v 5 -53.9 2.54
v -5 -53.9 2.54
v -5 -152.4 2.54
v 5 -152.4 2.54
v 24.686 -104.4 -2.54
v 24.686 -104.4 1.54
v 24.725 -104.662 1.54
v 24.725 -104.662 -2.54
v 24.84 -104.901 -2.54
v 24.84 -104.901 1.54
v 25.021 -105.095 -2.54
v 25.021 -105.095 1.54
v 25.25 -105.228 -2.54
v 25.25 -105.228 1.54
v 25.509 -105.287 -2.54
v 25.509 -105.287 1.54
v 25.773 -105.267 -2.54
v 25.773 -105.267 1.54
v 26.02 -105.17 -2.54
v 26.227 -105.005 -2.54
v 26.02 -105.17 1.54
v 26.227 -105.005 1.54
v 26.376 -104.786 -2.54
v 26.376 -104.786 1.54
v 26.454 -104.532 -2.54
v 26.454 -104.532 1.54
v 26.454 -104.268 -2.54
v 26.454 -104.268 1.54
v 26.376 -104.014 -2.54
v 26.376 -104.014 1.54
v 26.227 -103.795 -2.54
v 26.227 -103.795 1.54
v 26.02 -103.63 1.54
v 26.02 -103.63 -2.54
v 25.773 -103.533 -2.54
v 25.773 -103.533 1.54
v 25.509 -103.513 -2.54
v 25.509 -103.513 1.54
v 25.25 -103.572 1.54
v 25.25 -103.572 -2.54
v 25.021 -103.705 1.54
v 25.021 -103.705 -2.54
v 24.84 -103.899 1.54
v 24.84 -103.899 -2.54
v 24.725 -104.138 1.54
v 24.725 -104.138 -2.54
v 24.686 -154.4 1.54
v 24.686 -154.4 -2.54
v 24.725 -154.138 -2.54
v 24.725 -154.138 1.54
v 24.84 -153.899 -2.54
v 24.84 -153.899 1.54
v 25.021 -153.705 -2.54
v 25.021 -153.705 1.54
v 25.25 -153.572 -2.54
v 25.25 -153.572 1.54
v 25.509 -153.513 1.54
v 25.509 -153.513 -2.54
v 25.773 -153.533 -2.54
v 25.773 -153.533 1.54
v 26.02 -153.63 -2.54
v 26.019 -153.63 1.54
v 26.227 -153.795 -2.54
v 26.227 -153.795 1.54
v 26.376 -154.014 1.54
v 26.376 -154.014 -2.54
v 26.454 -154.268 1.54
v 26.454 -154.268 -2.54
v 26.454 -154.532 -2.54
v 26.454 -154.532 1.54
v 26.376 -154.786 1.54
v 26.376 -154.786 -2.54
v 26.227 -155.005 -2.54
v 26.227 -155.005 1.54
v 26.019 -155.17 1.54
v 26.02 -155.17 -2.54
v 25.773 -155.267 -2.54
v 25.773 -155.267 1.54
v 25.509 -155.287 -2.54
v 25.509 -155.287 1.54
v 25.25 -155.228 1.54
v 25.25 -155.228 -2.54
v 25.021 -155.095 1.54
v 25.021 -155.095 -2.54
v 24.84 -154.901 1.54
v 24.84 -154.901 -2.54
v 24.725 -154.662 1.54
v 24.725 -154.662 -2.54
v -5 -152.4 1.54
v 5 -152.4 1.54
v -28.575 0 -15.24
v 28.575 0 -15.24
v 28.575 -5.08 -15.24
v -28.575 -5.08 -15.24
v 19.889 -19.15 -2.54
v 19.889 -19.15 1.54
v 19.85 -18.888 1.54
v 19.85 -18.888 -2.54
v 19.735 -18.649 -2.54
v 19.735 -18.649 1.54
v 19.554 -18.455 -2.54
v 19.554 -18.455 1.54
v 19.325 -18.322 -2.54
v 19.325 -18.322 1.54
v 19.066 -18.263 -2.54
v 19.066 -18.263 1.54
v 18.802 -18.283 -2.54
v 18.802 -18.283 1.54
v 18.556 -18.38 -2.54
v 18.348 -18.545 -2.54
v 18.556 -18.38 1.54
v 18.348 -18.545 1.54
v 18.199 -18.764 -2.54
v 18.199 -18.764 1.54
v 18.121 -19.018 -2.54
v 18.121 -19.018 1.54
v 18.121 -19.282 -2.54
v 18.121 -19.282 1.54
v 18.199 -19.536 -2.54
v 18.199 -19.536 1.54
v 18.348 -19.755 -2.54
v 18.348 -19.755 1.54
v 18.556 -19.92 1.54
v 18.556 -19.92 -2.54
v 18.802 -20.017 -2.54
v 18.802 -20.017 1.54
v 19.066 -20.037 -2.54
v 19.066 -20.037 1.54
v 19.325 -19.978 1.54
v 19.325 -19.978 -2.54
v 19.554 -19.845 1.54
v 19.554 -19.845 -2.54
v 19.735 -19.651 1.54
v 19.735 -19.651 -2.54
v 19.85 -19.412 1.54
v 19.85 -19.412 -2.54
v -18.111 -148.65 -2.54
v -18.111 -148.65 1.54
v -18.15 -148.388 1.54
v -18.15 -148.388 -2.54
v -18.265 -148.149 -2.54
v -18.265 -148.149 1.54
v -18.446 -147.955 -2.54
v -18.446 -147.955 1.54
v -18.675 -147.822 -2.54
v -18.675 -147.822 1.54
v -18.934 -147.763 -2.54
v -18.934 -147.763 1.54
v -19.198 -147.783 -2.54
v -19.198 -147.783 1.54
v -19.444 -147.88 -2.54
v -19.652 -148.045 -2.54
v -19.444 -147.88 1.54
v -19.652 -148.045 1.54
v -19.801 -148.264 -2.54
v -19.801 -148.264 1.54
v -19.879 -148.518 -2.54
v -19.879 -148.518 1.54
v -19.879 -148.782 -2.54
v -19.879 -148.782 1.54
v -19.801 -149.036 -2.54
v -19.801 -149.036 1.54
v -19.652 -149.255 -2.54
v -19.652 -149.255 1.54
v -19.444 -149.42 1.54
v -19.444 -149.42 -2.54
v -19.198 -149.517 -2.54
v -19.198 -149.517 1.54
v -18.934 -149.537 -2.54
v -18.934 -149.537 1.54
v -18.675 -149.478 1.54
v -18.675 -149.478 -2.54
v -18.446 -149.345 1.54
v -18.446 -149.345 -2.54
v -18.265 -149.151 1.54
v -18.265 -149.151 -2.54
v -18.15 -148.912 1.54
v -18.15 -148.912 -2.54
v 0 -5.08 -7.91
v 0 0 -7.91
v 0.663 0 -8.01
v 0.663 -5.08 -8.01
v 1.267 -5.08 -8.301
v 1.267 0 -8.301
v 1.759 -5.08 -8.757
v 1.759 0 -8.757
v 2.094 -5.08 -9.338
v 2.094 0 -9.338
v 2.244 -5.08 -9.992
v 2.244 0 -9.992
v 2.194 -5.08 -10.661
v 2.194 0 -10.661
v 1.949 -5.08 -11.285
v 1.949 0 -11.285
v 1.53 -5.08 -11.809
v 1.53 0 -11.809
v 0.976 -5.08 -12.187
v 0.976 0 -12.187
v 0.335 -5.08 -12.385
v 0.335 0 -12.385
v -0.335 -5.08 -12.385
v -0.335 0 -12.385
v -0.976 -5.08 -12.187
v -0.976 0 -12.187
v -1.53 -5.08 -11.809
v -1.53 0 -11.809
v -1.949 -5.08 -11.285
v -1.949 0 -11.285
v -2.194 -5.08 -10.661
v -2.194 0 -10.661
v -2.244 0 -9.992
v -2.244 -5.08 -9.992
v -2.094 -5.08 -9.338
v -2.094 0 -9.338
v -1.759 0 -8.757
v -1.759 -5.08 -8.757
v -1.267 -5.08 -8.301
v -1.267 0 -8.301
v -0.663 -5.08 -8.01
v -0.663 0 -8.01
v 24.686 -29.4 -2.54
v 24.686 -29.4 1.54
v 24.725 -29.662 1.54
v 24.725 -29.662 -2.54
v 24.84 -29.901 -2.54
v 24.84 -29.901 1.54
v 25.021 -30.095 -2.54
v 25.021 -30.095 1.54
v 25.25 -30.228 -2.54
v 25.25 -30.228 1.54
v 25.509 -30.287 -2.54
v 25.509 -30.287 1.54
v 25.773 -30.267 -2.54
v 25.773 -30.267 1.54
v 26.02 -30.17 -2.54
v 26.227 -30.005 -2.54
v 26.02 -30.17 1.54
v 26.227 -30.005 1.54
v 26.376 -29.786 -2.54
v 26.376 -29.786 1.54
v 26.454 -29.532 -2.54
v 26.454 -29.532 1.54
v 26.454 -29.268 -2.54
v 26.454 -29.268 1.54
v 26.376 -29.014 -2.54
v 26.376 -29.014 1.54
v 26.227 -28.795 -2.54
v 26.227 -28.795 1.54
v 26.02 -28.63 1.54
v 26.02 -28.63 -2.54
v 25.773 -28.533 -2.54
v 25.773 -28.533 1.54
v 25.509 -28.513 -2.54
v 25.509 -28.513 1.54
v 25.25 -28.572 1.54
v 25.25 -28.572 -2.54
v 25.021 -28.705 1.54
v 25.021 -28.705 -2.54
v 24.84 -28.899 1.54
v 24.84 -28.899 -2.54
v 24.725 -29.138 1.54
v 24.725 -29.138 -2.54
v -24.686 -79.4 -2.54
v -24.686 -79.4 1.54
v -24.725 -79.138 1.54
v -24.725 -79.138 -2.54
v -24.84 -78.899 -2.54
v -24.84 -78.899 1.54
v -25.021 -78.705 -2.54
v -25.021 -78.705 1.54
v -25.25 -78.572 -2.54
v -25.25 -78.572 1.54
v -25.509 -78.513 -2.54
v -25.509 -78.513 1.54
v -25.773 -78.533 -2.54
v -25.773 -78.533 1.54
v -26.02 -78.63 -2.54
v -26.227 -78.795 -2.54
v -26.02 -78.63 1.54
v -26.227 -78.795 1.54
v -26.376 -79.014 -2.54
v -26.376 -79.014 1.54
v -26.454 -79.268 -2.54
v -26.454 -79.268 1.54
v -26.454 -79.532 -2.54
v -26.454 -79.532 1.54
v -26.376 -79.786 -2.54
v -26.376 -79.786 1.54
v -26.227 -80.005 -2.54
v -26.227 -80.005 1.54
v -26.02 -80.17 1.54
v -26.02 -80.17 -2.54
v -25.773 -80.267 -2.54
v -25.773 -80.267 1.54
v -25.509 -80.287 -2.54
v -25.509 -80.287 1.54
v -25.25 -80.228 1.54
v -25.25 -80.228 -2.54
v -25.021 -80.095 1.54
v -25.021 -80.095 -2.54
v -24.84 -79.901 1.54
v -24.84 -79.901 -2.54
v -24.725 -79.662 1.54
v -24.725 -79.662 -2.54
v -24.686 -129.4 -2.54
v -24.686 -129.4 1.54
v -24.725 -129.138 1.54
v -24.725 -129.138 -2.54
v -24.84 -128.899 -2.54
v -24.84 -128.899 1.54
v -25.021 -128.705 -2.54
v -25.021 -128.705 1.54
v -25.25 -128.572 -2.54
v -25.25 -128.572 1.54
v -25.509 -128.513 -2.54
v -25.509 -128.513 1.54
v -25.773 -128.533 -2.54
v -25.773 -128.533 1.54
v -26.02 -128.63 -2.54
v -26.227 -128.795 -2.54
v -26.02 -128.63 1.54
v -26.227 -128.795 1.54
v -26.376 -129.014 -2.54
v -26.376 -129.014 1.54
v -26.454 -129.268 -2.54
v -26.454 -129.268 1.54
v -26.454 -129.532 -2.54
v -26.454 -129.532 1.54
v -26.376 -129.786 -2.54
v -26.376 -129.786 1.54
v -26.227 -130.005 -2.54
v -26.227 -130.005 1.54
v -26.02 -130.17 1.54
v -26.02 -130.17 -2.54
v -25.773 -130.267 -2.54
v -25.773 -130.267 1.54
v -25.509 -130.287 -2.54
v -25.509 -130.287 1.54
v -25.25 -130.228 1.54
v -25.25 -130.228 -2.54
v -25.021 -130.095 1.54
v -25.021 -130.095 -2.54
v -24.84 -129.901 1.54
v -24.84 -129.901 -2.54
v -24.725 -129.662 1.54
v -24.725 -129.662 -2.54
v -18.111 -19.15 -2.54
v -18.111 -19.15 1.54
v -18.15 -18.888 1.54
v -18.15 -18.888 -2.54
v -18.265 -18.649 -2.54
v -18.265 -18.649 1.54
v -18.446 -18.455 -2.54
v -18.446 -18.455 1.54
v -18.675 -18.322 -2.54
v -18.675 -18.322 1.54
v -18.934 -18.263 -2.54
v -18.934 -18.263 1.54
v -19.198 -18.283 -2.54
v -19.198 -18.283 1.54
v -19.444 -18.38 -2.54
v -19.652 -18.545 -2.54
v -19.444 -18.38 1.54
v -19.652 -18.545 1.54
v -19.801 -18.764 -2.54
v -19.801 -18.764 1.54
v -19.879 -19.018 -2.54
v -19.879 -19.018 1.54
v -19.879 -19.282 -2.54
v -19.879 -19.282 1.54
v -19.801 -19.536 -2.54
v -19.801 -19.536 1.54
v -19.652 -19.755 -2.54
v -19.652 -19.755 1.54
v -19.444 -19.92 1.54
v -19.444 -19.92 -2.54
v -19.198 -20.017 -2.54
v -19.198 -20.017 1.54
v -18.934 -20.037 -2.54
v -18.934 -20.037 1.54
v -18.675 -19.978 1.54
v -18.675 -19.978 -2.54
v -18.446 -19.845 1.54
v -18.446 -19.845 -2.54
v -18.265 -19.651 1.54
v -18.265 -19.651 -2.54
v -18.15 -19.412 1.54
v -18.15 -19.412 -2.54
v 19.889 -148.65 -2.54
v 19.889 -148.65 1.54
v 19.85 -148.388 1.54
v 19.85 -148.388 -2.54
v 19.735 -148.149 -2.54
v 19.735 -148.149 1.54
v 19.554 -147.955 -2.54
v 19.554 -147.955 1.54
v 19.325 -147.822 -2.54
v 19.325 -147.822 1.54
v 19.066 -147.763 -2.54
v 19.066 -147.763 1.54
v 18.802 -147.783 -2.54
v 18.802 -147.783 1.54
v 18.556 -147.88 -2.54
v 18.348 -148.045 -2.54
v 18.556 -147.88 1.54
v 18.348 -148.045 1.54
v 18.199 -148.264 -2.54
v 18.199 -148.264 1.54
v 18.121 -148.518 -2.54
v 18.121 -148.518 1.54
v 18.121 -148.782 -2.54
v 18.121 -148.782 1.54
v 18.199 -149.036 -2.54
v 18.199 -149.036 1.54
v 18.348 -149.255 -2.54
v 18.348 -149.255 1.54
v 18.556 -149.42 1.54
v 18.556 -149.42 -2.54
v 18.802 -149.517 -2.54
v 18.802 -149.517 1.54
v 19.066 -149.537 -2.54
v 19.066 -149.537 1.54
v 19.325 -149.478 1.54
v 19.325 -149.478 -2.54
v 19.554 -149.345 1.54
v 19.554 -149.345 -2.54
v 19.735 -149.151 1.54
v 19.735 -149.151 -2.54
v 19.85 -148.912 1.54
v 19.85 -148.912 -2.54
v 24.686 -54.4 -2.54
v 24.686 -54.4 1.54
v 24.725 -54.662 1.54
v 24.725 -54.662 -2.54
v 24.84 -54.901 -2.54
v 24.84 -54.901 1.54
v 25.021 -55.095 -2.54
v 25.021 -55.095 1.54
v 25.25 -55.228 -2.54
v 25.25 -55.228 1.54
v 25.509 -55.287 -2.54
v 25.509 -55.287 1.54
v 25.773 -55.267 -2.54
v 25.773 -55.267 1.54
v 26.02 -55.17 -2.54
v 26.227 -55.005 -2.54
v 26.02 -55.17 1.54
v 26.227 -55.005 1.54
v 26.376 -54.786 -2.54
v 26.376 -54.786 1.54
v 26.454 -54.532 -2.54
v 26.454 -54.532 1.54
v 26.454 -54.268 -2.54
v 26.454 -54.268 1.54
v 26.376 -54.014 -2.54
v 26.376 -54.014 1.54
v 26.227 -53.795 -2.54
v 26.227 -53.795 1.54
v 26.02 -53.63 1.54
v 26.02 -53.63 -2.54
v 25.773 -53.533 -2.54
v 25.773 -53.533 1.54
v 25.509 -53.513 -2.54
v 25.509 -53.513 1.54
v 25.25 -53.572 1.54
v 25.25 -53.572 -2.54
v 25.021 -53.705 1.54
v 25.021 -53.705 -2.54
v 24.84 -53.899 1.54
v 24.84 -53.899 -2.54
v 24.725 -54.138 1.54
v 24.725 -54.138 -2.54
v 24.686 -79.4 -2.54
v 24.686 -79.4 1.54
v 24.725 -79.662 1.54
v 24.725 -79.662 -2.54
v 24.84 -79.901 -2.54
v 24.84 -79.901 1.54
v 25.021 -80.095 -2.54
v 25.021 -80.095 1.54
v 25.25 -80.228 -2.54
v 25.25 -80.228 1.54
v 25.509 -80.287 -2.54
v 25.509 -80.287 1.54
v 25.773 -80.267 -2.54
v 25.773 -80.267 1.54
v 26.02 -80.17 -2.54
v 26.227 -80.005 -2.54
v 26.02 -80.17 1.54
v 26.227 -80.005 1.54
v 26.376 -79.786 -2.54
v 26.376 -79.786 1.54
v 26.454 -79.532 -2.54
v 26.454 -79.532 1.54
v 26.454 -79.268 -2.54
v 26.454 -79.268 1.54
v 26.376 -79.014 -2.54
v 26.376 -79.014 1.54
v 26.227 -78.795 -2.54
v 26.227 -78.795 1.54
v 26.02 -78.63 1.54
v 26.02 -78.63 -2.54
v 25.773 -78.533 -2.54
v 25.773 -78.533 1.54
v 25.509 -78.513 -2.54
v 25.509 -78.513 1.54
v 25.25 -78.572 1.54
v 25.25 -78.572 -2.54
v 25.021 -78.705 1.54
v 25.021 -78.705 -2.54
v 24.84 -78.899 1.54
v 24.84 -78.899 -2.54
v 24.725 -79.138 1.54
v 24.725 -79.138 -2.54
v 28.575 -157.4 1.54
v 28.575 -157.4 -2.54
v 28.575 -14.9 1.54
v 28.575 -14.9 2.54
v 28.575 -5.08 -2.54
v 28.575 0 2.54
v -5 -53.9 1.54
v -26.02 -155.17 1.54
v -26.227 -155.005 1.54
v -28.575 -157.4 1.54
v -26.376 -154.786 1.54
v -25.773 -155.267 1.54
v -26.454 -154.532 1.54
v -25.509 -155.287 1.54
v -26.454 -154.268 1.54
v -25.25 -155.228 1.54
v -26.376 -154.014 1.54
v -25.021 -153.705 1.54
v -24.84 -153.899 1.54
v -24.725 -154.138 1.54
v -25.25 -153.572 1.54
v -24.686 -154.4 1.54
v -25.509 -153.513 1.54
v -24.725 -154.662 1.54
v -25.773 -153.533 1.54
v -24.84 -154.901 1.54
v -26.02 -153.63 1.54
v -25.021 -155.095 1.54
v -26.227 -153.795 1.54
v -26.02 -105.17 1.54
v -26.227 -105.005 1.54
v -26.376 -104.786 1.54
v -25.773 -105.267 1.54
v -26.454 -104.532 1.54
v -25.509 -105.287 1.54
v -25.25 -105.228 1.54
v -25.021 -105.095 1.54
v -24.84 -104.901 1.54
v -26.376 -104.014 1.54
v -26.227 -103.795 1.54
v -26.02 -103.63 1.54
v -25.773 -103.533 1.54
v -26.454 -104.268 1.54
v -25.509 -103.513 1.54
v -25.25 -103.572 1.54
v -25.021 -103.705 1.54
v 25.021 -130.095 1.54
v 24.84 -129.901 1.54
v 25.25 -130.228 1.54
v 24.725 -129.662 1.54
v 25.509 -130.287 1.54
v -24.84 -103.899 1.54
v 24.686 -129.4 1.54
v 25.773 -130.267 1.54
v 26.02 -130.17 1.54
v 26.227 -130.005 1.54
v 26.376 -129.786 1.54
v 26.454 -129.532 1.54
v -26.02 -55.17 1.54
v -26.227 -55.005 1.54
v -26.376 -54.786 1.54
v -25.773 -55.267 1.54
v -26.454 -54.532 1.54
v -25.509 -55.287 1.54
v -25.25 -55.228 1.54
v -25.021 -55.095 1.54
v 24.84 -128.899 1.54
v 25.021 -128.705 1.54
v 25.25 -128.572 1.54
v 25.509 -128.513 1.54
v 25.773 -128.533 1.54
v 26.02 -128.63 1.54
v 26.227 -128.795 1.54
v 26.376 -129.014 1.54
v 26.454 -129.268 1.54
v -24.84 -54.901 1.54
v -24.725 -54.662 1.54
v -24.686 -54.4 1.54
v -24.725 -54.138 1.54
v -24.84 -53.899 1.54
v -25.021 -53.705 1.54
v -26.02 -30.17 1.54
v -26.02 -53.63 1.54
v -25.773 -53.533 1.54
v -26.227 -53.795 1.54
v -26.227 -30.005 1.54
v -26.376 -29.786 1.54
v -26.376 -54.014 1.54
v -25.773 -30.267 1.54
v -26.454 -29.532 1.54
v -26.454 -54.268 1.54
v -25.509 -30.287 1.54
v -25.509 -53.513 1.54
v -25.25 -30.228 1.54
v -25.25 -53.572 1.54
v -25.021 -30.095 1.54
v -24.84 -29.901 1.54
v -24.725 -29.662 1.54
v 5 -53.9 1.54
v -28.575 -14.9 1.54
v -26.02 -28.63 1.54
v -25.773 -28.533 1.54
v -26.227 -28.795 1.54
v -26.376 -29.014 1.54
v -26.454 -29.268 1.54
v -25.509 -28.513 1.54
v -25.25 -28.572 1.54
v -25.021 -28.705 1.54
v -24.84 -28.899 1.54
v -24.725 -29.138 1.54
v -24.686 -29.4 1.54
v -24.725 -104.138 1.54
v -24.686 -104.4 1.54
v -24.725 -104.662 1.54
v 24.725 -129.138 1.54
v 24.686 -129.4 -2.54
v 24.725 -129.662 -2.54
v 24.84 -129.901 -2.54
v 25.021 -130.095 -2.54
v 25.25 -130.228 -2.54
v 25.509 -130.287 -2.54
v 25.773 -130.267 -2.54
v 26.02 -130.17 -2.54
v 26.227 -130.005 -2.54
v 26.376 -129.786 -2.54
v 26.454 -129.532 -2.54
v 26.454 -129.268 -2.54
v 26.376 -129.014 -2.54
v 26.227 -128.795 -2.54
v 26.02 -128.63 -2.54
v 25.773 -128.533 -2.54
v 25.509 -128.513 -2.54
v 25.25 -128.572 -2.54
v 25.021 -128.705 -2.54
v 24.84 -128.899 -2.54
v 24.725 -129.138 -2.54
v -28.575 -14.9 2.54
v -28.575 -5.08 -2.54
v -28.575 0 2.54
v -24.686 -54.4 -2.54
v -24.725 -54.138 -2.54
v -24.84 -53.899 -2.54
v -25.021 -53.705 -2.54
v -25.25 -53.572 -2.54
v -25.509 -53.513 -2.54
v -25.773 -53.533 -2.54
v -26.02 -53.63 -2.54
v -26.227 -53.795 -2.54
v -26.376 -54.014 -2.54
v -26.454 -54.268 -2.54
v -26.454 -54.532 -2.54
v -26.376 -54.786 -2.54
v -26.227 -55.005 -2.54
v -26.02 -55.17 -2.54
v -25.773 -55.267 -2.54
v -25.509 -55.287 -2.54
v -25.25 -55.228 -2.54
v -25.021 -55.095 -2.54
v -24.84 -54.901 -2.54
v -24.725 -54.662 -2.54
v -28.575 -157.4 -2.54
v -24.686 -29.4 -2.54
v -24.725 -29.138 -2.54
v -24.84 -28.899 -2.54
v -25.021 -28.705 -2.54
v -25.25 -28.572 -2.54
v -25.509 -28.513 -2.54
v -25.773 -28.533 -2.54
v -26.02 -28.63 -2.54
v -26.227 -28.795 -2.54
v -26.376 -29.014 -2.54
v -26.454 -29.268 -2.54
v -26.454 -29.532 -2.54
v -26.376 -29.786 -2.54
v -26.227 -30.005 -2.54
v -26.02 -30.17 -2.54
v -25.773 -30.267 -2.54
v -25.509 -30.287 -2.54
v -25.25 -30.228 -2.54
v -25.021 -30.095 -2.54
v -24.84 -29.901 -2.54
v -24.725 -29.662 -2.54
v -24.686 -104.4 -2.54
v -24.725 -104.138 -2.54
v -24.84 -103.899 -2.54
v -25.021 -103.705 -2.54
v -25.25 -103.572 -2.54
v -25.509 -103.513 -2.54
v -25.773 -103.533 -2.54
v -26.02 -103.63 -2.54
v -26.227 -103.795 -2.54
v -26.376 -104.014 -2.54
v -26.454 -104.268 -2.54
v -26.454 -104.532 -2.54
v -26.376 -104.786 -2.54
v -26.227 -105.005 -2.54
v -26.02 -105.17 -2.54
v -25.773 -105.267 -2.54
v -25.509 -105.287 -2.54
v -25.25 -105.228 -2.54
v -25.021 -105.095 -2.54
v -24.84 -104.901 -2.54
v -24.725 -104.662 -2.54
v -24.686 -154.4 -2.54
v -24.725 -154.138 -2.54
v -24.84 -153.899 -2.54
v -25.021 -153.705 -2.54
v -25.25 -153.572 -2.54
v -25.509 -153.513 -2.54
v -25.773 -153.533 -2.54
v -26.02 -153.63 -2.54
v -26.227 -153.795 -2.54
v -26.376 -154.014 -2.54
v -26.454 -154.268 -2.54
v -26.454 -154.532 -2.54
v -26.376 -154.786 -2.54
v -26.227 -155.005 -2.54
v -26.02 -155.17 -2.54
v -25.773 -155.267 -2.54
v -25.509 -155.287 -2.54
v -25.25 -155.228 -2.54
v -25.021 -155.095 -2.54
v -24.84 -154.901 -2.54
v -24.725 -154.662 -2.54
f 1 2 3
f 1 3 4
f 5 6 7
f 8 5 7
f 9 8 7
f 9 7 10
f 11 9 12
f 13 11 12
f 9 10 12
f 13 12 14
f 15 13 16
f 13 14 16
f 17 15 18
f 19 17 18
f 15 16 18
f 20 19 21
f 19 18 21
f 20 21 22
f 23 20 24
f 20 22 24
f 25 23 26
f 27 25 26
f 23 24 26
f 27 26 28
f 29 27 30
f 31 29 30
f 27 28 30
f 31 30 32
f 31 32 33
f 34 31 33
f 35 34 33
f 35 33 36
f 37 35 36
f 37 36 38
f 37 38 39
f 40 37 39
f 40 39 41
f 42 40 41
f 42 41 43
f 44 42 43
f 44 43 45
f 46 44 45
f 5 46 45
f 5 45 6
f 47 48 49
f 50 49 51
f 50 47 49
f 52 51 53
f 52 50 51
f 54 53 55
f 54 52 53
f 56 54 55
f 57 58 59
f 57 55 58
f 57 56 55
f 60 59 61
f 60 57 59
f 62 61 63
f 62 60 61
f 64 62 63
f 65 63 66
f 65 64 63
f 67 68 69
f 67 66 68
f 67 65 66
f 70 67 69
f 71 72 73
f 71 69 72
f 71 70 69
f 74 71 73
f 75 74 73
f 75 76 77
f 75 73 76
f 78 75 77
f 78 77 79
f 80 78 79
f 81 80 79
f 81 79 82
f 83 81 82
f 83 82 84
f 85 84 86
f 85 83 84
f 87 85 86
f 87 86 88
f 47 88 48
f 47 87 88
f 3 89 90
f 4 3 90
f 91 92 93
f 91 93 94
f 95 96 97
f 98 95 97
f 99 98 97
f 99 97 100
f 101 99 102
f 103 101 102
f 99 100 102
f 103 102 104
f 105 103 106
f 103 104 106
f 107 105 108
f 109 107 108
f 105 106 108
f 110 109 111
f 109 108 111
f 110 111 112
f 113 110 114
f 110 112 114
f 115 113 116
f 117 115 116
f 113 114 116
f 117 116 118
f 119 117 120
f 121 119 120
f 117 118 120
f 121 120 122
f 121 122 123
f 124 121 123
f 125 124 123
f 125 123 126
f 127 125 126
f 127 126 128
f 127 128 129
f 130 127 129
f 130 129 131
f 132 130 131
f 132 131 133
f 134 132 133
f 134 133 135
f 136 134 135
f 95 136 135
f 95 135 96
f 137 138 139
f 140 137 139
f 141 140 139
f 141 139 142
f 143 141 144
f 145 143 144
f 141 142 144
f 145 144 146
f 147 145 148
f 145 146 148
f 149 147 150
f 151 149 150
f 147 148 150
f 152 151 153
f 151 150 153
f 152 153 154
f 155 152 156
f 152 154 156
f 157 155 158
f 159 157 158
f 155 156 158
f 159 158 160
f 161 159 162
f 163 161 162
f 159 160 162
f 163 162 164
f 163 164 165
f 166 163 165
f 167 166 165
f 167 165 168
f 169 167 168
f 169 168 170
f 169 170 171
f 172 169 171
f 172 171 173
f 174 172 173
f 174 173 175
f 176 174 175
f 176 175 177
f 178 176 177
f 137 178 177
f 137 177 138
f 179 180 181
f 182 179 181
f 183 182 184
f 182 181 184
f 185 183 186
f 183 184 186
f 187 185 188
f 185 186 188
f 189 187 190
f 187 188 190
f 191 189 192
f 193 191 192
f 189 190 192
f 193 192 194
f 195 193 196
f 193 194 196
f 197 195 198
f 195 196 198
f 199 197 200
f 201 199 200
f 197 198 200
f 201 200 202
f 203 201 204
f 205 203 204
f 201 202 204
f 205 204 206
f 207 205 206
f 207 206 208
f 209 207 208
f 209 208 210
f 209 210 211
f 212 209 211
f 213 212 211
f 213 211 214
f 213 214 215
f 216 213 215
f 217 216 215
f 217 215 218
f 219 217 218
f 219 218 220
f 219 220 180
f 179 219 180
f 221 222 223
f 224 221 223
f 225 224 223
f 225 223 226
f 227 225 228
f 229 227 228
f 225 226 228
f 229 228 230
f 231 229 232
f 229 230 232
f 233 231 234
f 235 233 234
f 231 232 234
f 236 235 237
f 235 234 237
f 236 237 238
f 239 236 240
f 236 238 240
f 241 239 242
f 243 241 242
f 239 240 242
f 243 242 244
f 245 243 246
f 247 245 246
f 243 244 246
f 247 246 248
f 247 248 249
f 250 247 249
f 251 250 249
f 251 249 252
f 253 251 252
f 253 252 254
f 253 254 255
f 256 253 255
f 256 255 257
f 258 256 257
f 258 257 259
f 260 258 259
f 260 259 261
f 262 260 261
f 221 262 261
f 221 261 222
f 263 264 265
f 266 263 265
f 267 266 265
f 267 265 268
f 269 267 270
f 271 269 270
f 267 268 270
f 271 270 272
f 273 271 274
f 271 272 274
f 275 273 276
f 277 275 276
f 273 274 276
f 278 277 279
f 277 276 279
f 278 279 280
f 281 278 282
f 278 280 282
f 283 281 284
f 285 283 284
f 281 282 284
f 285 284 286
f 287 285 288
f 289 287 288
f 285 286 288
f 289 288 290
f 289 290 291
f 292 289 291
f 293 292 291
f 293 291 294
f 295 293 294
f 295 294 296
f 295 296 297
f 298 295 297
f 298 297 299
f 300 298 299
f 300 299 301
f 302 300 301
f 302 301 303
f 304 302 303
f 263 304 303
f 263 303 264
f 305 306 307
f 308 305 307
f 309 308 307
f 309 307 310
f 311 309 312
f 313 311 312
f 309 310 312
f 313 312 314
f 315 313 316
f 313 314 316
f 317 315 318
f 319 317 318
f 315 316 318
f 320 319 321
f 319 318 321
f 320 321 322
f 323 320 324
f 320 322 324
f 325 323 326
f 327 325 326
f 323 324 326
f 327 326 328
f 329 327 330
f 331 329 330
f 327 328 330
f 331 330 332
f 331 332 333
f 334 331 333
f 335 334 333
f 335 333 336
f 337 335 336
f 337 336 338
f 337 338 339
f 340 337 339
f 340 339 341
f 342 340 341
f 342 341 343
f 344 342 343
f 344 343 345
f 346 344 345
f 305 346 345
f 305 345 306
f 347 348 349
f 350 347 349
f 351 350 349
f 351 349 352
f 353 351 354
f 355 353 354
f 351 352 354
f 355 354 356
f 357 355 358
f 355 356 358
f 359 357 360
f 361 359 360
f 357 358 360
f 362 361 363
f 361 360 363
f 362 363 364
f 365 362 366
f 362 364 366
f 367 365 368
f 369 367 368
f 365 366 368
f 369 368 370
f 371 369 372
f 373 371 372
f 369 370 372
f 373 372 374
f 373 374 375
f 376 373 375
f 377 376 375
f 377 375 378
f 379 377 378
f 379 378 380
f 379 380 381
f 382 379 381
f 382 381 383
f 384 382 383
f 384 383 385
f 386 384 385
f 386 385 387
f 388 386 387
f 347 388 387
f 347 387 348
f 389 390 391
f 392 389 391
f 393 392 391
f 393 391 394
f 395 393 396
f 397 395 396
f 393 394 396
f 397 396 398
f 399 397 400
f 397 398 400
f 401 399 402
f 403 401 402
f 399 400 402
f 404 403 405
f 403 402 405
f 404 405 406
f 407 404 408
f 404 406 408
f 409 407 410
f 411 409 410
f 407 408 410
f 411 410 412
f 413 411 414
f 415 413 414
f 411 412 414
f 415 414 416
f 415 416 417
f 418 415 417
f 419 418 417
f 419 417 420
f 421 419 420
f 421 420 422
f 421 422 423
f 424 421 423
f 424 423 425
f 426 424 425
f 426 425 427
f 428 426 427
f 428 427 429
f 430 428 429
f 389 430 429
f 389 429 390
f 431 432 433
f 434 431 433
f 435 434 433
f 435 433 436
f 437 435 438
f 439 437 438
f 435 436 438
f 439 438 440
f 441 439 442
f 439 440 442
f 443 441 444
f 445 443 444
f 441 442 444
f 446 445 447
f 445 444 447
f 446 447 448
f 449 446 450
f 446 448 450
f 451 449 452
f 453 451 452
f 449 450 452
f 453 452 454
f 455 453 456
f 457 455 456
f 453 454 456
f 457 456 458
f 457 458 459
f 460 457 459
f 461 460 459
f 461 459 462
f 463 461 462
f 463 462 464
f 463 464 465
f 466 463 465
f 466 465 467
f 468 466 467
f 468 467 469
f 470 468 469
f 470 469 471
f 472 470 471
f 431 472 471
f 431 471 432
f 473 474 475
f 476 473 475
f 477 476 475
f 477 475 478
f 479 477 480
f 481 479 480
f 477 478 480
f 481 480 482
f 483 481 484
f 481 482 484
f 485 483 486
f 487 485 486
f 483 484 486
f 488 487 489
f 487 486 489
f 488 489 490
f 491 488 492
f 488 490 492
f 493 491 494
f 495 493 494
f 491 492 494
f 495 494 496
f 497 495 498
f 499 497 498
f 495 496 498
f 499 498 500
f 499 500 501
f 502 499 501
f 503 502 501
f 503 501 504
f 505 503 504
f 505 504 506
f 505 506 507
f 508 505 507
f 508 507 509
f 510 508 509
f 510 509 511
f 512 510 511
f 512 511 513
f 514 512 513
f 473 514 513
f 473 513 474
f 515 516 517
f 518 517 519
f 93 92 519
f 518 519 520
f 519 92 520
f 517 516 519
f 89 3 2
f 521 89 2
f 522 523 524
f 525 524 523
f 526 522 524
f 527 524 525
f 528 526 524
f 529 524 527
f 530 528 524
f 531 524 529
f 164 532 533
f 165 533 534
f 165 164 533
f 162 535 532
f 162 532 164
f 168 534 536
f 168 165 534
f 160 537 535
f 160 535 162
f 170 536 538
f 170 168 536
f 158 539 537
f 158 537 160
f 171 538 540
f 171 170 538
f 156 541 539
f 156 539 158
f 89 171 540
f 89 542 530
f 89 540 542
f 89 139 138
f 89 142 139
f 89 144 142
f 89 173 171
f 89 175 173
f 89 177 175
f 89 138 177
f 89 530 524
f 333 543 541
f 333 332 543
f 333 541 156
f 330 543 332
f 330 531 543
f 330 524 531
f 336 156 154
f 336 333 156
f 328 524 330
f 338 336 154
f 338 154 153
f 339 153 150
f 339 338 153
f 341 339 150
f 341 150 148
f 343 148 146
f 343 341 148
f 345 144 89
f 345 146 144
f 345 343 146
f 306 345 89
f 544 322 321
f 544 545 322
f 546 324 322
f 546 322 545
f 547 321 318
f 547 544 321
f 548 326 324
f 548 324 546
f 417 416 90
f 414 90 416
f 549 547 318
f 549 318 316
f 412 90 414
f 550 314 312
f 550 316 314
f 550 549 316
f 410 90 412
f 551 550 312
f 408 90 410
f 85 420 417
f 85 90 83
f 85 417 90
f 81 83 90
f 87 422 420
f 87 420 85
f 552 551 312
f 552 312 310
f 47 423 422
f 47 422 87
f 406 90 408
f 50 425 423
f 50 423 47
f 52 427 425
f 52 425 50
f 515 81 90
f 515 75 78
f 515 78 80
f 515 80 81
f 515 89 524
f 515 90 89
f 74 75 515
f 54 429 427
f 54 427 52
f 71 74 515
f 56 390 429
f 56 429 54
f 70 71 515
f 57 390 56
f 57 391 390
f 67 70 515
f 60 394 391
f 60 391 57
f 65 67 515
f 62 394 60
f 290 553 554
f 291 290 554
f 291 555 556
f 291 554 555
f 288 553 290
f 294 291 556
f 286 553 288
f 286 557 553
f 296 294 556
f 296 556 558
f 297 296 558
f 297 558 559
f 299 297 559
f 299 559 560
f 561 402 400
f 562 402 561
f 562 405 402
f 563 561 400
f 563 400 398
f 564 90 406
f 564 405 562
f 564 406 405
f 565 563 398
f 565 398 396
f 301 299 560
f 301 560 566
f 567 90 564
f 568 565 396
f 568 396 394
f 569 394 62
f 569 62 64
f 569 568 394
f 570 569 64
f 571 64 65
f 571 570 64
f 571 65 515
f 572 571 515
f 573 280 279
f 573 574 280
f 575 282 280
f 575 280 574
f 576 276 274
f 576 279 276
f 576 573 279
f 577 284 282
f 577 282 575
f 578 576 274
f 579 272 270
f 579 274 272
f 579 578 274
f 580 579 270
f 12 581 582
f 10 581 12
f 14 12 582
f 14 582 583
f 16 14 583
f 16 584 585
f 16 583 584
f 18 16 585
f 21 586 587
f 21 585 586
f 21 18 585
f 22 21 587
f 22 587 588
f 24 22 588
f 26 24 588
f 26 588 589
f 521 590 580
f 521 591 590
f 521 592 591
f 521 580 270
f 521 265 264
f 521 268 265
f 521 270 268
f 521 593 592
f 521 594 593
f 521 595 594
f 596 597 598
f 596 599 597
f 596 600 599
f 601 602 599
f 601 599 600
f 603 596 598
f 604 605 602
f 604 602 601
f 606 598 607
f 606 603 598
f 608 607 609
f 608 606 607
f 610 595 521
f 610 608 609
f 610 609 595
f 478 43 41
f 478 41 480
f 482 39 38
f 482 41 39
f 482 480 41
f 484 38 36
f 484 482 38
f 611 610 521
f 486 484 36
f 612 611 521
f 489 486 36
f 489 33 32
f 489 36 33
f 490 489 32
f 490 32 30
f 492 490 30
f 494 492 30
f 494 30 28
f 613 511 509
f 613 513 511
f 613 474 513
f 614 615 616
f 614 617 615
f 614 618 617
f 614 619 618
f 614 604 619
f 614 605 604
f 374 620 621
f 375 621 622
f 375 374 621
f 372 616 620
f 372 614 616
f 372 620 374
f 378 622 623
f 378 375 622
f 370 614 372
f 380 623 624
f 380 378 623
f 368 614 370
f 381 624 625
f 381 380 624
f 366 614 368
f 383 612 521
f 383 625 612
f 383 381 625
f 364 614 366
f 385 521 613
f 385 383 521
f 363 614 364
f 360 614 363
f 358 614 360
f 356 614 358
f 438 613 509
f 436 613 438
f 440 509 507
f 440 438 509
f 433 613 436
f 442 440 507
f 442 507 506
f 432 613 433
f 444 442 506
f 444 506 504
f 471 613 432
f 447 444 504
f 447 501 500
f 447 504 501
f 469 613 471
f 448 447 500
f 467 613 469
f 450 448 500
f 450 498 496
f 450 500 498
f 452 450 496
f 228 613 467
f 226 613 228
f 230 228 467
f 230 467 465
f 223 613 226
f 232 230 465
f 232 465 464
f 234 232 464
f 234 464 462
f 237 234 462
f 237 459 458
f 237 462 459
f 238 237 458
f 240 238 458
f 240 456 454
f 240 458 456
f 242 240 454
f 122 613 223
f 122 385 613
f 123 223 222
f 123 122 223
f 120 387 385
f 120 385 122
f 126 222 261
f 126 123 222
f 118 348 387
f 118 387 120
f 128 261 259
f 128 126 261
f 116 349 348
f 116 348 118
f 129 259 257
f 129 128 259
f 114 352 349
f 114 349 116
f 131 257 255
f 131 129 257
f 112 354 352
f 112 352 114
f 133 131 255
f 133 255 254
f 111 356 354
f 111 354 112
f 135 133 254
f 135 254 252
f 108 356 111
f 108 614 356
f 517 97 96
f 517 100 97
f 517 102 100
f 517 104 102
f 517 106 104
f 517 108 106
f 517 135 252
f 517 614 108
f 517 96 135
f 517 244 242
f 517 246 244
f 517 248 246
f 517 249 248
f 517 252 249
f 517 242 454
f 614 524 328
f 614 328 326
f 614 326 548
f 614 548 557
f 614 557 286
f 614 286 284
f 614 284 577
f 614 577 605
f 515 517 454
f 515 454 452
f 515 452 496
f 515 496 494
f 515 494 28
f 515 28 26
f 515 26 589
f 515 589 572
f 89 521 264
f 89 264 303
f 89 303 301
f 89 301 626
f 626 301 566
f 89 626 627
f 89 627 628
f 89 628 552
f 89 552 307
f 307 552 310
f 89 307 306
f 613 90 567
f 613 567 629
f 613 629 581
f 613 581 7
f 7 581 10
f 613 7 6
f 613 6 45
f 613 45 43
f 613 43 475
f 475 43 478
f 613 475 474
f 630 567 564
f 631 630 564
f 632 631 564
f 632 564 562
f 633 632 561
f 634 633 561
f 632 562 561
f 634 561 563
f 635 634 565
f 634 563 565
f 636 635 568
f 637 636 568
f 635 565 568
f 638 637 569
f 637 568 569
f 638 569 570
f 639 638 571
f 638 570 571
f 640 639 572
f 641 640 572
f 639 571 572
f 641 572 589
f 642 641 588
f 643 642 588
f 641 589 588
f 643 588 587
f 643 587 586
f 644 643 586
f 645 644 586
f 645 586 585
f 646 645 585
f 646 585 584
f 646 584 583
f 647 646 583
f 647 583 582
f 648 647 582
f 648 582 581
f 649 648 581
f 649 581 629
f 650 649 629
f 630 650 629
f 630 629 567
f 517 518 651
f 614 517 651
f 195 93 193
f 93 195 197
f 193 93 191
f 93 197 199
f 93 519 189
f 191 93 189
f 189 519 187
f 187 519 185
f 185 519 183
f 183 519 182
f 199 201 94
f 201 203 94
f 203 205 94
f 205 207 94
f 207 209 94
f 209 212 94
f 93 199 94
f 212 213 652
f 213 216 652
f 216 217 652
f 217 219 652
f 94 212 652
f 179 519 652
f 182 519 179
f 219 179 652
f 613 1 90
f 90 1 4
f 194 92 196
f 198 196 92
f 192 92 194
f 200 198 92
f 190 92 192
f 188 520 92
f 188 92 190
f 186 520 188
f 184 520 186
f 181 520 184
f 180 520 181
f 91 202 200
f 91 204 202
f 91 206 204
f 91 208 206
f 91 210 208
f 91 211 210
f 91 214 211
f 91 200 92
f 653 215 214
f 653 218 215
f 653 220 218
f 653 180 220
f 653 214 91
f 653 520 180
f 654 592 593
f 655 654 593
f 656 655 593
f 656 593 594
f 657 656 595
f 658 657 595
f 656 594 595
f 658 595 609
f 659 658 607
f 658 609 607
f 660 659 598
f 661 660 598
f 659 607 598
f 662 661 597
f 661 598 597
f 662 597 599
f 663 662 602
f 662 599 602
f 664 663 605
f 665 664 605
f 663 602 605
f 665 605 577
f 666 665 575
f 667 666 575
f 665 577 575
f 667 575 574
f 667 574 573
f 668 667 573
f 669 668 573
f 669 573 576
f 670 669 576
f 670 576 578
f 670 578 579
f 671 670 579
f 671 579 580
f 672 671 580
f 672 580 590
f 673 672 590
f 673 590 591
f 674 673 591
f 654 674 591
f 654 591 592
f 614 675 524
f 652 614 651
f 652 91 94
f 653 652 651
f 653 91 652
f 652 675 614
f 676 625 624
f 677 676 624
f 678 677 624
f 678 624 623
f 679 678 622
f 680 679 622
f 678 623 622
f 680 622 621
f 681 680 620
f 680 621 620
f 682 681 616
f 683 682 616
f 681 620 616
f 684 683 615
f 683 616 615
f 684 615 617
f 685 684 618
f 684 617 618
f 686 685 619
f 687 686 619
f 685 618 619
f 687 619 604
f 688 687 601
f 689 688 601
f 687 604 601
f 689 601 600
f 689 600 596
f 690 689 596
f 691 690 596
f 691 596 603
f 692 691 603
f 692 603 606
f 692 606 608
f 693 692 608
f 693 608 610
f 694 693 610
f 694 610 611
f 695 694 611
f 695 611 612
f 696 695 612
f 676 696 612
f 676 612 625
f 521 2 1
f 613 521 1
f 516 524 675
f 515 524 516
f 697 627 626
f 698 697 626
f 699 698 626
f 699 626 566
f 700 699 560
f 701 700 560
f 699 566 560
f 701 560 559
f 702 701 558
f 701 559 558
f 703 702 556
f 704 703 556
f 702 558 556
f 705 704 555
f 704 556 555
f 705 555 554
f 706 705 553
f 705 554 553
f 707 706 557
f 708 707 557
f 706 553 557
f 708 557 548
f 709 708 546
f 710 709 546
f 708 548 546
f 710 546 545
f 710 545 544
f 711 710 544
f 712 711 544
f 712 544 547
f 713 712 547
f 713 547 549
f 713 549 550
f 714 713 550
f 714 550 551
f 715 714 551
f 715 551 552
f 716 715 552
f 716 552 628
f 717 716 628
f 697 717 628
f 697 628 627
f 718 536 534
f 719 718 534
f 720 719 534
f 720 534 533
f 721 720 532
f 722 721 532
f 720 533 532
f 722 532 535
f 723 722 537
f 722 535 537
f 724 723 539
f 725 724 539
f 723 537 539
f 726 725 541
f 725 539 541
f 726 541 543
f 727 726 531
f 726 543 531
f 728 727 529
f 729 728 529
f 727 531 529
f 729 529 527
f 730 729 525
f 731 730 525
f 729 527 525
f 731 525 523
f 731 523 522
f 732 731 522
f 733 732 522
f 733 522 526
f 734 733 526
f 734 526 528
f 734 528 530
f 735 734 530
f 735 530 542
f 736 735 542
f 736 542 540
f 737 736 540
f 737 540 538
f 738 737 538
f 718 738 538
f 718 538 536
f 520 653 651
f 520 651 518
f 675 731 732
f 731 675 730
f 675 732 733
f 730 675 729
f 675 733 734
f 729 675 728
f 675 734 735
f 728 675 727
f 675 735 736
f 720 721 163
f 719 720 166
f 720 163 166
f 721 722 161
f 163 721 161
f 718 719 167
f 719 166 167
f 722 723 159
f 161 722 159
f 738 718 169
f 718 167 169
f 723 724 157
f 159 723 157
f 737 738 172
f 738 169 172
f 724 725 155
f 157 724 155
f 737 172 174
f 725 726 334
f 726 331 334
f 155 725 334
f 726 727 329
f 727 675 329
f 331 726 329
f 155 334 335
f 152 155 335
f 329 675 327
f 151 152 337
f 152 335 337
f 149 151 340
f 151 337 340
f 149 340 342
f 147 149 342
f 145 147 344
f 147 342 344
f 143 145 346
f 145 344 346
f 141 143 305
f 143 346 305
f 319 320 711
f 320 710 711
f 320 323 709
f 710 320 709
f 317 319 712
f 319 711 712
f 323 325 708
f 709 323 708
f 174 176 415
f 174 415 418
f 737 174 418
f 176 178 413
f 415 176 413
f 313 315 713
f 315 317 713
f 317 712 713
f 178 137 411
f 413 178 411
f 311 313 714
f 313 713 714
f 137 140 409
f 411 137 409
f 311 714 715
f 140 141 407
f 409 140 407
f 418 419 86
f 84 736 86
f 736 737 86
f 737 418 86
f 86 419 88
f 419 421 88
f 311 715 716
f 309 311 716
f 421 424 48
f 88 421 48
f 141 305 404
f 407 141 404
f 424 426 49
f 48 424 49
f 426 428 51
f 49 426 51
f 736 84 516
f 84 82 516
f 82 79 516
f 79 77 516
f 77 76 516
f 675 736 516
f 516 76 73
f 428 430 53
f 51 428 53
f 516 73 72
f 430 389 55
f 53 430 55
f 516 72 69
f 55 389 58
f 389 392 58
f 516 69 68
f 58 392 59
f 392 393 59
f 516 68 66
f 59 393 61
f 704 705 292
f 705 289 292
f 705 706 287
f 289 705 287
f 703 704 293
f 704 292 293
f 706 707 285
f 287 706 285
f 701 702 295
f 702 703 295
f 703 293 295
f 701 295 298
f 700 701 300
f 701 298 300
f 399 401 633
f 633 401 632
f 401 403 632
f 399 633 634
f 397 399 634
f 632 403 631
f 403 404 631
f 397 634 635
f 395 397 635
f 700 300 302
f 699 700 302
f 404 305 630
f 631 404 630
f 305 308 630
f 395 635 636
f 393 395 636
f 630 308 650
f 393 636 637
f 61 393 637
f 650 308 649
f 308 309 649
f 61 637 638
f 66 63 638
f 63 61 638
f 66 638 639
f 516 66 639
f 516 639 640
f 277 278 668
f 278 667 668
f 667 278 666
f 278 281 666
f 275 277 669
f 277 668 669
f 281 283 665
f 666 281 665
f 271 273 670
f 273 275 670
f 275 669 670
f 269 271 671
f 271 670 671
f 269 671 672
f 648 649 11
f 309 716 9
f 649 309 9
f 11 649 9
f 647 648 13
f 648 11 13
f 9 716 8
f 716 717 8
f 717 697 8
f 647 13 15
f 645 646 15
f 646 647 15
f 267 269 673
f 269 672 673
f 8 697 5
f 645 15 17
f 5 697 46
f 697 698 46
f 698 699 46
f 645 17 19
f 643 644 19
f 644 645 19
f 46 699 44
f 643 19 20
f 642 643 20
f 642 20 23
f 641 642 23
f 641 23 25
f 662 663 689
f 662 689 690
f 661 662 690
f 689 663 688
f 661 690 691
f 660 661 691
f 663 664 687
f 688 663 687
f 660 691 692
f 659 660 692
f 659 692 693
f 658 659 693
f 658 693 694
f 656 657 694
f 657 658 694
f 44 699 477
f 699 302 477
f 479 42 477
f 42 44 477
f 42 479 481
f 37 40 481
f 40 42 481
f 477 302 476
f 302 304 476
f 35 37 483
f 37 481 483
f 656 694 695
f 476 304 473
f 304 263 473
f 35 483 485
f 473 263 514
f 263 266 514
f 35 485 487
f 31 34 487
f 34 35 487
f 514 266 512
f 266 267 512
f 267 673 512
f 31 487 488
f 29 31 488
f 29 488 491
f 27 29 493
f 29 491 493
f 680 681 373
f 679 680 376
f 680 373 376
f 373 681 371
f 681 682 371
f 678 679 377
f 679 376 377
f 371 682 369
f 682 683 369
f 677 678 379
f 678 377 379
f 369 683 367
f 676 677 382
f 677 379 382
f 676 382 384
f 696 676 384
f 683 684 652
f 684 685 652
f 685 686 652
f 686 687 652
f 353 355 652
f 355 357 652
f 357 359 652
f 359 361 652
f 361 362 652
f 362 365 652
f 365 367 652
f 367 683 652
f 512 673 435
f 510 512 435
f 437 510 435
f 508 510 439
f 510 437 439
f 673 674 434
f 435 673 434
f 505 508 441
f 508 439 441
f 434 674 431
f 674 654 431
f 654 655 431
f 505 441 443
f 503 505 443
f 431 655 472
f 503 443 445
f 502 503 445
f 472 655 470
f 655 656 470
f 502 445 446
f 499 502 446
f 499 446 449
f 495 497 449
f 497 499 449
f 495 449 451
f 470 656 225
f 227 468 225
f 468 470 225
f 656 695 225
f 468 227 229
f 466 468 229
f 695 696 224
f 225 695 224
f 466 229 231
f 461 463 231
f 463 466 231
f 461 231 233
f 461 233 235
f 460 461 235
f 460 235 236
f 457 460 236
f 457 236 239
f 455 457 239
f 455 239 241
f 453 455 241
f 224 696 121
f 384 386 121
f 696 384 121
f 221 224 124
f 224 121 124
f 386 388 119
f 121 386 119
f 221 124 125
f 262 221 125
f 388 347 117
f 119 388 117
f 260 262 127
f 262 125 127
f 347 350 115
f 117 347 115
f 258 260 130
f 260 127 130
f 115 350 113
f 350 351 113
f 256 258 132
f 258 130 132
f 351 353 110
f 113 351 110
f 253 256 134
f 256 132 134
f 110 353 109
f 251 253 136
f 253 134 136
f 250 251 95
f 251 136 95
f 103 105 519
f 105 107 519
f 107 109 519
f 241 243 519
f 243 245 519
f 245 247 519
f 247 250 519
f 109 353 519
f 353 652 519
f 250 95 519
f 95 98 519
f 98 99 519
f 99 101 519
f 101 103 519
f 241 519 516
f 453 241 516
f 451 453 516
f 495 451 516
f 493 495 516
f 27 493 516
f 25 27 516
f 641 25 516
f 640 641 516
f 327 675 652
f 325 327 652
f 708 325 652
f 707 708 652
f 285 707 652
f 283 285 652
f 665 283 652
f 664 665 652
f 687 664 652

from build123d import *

# Parameters (mm, degrees)
SKETCH1_W                 = 57.15
SKETCH1_H                 = 5.08
BOSS_EXTRUDE1_DEPTH       = 152.4
CUT_EXTRUDE1_DEPTH        = 1
SKETCH3_W                 = 57.15
SKETCH3_H                 = 5.08
BOSS_EXTRUDE2_DEPTH       = 12.7
SKETCH4_R                 = 2.25
CUT_EXTRUDE2_DEPTH        = 12.7
SKETCH5_R                 = 0.889
CUT_EXTRUDE3_DEPTH        = 156.961081764
SKETCH6_W                 = 57.15
SKETCH6_H                 = 4.08
BOSS_EXTRUDE3_DEPTH       = 5
SKETCH7_R                 = 0.889
CUT_EXTRUDE4_DEPTH        = 161.850424386
LPATTERN1_COUNT           = 6
LPATTERN1_PITCH           = 25
LPATTERN1_COPY_1_SKETCH_R = 0.889
LPATTERN1_COPY_1_DEPTH    = 161.850424386
LPATTERN1_COPY_2_SKETCH_R = 0.889
LPATTERN1_COPY_2_DEPTH    = 161.850424386
LPATTERN1_COPY_3_SKETCH_R = 0.889
LPATTERN1_COPY_3_DEPTH    = 161.850424386
LPATTERN1_COPY_4_SKETCH_R = 0.889
LPATTERN1_COPY_4_DEPTH    = 161.850424386
LPATTERN1_COPY_5_SKETCH_R = 0.889
LPATTERN1_COPY_5_DEPTH    = 161.850424386


with BuildPart() as part:
    # Sketch1 → Boss-Extrude1 (new body)
    with BuildSketch(Plane(origin=(0, 0, 0), x_dir=(1, 0, 0), z_dir=(0, 1, 0))):
        Rectangle(SKETCH1_W, SKETCH1_H)
    extrude(amount=-BOSS_EXTRUDE1_DEPTH)

    # Sketch2 → Cut-Extrude1 (cut)
    with BuildSketch(Plane.XY.offset(2.54)):
        Polygon((-5, -152.4), (-5, -53.9), (5, -53.9), (5, -152.4), (28.575, -152.4), (28.575, -14.9), (-28.575, -14.9), (-28.575, -152.4), align=None)
    extrude(amount=-CUT_EXTRUDE1_DEPTH, mode=Mode.SUBTRACT)

    # Sketch3 → Boss-Extrude2 (add)
    with BuildSketch(Plane(origin=(0, 0, -2.54), x_dir=(-1, 0, 0), z_dir=(0, 0, -1))):
        with Locations((0, -2.54)):
            Rectangle(SKETCH3_W, SKETCH3_H)
    extrude(amount=BOSS_EXTRUDE2_DEPTH)

    # Sketch4 → Cut-Extrude2 (cut)
    with BuildSketch(Plane(origin=(0, 0, 0), x_dir=(1, 0, 0), z_dir=(0, 1, 0))):
        with Locations(Location((0, 10.16, 0), (0, 0, 270))):
            Circle(SKETCH4_R)
    extrude(amount=-CUT_EXTRUDE2_DEPTH, mode=Mode.SUBTRACT)

    # Sketch5 → Cut-Extrude3 (cut, through all)
    with BuildSketch(Plane.XY.offset(1.54)):
        with Locations((-19, -19.15)):
            Circle(SKETCH5_R)
        with Locations((19, -19.15)):
            Circle(SKETCH5_R)
        with Locations((-19, -148.65)):
            Circle(SKETCH5_R)
        with Locations((19, -148.65)):
            Circle(SKETCH5_R)
    extrude(amount=-CUT_EXTRUDE3_DEPTH, mode=Mode.SUBTRACT)

    # Sketch6 → Boss-Extrude3 (add)
    with BuildSketch(Plane.XZ.offset(152.4)):
        with Locations((0, -0.5)):
            Rectangle(SKETCH6_W, SKETCH6_H)
    extrude(amount=BOSS_EXTRUDE3_DEPTH)

    # Sketch7 → Cut-Extrude4 (cut, through all)
    with BuildSketch(Plane.XY.offset(1.54)):
        with Locations((-25.575, -154.4)):
            Circle(SKETCH7_R)
    cut_extrude4 = extrude(amount=-CUT_EXTRUDE4_DEPTH, mode=Mode.SUBTRACT)

    # Mirror1: Cut-Extrude4 across plane
    add(cut_extrude4.mirror(Plane(origin=(0, 0, 0), x_dir=(0, 0, 1), z_dir=(1, 0, 0))), mode=Mode.SUBTRACT)

    # LPattern1: Cut-Extrude4 ×6
    with Locations(*[(0, i * LPATTERN1_PITCH, 0) for i in range(1, LPATTERN1_COUNT)]):
        add(cut_extrude4, mode=Mode.SUBTRACT)

    # LPattern1 copy 1 sketch → LPattern1 copy 1 (cut, through all)
    with BuildSketch(Plane(origin=(0, 25, 1.54), x_dir=(-1, 0, 0), z_dir=(0, 0, 1))):
        with Locations((-25.575, 154.4)):
            Circle(LPATTERN1_COPY_1_SKETCH_R)
    extrude(amount=-LPATTERN1_COPY_1_DEPTH, mode=Mode.SUBTRACT)

    # LPattern1 copy 2 sketch → LPattern1 copy 2 (cut, through all)
    with BuildSketch(Plane(origin=(0, 50, 1.54), x_dir=(-1, 0, 0), z_dir=(0, 0, 1))):
        with Locations((-25.575, 154.4)):
            Circle(LPATTERN1_COPY_2_SKETCH_R)
    extrude(amount=-LPATTERN1_COPY_2_DEPTH, mode=Mode.SUBTRACT)

    # LPattern1 copy 3 sketch → LPattern1 copy 3 (cut, through all)
    with BuildSketch(Plane(origin=(0, 75, 1.54), x_dir=(-1, 0, 0), z_dir=(0, 0, 1))):
        with Locations((-25.575, 154.4)):
            Circle(LPATTERN1_COPY_3_SKETCH_R)
    extrude(amount=-LPATTERN1_COPY_3_DEPTH, mode=Mode.SUBTRACT)

    # LPattern1 copy 4 sketch → LPattern1 copy 4 (cut, through all)
    with BuildSketch(Plane(origin=(0, 100, 1.54), x_dir=(-1, 0, 0), z_dir=(0, 0, 1))):
        with Locations((-25.575, 154.4)):
            Circle(LPATTERN1_COPY_4_SKETCH_R)
    extrude(amount=-LPATTERN1_COPY_4_DEPTH, mode=Mode.SUBTRACT)

    # LPattern1 copy 5 sketch → LPattern1 copy 5 (cut, through all)
    with BuildSketch(Plane(origin=(0, 125, 1.54), x_dir=(-1, 0, 0), z_dir=(0, 0, 1))):
        with Locations((-25.575, 154.4)):
            Circle(LPATTERN1_COPY_5_SKETCH_R)
    extrude(amount=-LPATTERN1_COPY_5_DEPTH, mode=Mode.SUBTRACT)


solid = part.part
